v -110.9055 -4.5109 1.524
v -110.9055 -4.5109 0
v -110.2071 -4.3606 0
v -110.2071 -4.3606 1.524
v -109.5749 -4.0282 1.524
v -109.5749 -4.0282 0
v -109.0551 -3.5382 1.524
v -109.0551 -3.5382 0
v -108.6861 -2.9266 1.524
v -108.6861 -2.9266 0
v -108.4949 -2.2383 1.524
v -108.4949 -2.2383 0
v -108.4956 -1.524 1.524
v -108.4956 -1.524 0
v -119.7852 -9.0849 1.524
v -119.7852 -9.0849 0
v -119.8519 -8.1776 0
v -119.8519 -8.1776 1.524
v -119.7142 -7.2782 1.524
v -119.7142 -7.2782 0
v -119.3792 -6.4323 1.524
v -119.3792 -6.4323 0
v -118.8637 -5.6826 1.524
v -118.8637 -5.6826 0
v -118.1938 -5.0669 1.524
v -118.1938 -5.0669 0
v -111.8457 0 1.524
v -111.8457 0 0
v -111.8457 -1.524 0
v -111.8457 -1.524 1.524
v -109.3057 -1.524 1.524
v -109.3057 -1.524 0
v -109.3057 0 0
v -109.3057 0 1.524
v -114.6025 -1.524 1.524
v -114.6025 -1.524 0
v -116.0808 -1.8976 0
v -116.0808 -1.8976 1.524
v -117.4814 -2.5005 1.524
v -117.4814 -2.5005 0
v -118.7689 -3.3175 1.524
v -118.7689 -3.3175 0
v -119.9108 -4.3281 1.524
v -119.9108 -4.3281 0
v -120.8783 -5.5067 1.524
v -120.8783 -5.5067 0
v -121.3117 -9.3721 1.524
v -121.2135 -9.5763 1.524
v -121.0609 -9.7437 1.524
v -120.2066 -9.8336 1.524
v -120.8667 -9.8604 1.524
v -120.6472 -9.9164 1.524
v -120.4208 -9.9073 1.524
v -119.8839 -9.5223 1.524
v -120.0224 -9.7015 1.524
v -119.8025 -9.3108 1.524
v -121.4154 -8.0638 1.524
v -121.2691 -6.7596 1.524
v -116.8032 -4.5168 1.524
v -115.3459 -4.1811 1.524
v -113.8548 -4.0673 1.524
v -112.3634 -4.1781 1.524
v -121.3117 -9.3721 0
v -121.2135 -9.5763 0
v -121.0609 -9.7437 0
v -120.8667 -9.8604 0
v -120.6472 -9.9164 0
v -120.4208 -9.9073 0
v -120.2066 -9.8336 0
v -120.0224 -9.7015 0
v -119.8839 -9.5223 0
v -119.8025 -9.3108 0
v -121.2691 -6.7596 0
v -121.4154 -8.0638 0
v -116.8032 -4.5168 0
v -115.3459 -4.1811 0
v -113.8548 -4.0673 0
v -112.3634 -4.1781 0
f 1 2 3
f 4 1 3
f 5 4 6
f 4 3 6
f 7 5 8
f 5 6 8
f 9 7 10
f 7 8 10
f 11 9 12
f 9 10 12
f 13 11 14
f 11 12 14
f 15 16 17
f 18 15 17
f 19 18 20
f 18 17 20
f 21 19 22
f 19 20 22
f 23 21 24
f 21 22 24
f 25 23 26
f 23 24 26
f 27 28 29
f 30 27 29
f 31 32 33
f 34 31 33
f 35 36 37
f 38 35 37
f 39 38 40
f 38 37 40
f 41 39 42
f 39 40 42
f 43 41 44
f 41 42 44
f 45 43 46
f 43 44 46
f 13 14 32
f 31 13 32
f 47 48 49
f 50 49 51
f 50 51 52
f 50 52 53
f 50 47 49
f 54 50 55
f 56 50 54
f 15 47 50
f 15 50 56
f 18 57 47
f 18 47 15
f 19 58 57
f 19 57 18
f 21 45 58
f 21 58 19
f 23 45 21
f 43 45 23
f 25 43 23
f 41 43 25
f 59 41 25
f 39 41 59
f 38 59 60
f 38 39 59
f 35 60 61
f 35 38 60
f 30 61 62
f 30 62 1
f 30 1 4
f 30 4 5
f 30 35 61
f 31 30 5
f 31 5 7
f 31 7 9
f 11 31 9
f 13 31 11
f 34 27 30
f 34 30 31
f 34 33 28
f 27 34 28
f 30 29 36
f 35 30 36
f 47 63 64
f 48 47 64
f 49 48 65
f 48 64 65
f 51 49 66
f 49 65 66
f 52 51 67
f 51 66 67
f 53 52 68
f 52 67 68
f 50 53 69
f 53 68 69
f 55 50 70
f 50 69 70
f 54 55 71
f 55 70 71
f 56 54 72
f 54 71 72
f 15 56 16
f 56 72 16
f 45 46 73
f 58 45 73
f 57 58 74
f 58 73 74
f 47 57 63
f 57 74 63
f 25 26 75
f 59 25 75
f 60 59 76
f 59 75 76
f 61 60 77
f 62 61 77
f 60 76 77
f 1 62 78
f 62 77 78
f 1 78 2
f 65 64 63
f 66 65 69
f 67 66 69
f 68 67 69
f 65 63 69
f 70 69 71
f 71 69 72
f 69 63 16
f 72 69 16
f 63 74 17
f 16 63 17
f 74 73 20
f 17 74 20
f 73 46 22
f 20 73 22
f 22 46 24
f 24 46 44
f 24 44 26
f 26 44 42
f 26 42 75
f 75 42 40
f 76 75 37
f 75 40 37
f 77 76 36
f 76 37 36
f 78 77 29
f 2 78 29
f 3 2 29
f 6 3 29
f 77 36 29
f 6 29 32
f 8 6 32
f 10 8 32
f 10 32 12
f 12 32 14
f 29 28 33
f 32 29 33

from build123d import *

# Parameters (mm, degrees)
BOSS_EXTRUDE1_DEPTH = 1.524


with BuildPart() as part:
    # Sketch1 → Boss-Extrude1 (new body)
    with BuildSketch(Plane.XY):
        with BuildLine():
            Line((-111.845658384, 0), (-111.845658384, -1.524))
            Line((-111.845658384, -1.524), (-114.602460127, -1.524))
            ThreePointArc((-114.602460127, -1.524), (-118.141425353, -2.883409348), (-120.878346422, -5.506676721))
            ThreePointArc((-120.878346422, -5.506676721), (-121.373374596, -7.40819224), (-121.311747708, -9.372121029))
            ThreePointArc((-121.311747708, -9.372121029), (-120.420802234, -9.907256069), (-119.785228435, -9.084942689))
            ThreePointArc((-119.785228435, -9.084942689), (-119.570544838, -6.84579555), (-118.193770427, -5.066930411))
            ThreePointArc((-118.193770427, -5.066930411), (-114.602460127, -4.096166999), (-110.905453841, -4.510938975))
            ThreePointArc((-110.905453841, -4.510938975), (-109.055147034, -3.538155103), (-108.49557312, -1.524))
            Line((-108.49557312, -1.524), (-109.305658384, -1.524))
            Line((-109.305658384, -1.524), (-109.305658384, 0))
            Line((-109.305658384, 0), (-111.845658384, 0))
        make_face()
    extrude(amount=BOSS_EXTRUDE1_DEPTH)


solid = part.part
